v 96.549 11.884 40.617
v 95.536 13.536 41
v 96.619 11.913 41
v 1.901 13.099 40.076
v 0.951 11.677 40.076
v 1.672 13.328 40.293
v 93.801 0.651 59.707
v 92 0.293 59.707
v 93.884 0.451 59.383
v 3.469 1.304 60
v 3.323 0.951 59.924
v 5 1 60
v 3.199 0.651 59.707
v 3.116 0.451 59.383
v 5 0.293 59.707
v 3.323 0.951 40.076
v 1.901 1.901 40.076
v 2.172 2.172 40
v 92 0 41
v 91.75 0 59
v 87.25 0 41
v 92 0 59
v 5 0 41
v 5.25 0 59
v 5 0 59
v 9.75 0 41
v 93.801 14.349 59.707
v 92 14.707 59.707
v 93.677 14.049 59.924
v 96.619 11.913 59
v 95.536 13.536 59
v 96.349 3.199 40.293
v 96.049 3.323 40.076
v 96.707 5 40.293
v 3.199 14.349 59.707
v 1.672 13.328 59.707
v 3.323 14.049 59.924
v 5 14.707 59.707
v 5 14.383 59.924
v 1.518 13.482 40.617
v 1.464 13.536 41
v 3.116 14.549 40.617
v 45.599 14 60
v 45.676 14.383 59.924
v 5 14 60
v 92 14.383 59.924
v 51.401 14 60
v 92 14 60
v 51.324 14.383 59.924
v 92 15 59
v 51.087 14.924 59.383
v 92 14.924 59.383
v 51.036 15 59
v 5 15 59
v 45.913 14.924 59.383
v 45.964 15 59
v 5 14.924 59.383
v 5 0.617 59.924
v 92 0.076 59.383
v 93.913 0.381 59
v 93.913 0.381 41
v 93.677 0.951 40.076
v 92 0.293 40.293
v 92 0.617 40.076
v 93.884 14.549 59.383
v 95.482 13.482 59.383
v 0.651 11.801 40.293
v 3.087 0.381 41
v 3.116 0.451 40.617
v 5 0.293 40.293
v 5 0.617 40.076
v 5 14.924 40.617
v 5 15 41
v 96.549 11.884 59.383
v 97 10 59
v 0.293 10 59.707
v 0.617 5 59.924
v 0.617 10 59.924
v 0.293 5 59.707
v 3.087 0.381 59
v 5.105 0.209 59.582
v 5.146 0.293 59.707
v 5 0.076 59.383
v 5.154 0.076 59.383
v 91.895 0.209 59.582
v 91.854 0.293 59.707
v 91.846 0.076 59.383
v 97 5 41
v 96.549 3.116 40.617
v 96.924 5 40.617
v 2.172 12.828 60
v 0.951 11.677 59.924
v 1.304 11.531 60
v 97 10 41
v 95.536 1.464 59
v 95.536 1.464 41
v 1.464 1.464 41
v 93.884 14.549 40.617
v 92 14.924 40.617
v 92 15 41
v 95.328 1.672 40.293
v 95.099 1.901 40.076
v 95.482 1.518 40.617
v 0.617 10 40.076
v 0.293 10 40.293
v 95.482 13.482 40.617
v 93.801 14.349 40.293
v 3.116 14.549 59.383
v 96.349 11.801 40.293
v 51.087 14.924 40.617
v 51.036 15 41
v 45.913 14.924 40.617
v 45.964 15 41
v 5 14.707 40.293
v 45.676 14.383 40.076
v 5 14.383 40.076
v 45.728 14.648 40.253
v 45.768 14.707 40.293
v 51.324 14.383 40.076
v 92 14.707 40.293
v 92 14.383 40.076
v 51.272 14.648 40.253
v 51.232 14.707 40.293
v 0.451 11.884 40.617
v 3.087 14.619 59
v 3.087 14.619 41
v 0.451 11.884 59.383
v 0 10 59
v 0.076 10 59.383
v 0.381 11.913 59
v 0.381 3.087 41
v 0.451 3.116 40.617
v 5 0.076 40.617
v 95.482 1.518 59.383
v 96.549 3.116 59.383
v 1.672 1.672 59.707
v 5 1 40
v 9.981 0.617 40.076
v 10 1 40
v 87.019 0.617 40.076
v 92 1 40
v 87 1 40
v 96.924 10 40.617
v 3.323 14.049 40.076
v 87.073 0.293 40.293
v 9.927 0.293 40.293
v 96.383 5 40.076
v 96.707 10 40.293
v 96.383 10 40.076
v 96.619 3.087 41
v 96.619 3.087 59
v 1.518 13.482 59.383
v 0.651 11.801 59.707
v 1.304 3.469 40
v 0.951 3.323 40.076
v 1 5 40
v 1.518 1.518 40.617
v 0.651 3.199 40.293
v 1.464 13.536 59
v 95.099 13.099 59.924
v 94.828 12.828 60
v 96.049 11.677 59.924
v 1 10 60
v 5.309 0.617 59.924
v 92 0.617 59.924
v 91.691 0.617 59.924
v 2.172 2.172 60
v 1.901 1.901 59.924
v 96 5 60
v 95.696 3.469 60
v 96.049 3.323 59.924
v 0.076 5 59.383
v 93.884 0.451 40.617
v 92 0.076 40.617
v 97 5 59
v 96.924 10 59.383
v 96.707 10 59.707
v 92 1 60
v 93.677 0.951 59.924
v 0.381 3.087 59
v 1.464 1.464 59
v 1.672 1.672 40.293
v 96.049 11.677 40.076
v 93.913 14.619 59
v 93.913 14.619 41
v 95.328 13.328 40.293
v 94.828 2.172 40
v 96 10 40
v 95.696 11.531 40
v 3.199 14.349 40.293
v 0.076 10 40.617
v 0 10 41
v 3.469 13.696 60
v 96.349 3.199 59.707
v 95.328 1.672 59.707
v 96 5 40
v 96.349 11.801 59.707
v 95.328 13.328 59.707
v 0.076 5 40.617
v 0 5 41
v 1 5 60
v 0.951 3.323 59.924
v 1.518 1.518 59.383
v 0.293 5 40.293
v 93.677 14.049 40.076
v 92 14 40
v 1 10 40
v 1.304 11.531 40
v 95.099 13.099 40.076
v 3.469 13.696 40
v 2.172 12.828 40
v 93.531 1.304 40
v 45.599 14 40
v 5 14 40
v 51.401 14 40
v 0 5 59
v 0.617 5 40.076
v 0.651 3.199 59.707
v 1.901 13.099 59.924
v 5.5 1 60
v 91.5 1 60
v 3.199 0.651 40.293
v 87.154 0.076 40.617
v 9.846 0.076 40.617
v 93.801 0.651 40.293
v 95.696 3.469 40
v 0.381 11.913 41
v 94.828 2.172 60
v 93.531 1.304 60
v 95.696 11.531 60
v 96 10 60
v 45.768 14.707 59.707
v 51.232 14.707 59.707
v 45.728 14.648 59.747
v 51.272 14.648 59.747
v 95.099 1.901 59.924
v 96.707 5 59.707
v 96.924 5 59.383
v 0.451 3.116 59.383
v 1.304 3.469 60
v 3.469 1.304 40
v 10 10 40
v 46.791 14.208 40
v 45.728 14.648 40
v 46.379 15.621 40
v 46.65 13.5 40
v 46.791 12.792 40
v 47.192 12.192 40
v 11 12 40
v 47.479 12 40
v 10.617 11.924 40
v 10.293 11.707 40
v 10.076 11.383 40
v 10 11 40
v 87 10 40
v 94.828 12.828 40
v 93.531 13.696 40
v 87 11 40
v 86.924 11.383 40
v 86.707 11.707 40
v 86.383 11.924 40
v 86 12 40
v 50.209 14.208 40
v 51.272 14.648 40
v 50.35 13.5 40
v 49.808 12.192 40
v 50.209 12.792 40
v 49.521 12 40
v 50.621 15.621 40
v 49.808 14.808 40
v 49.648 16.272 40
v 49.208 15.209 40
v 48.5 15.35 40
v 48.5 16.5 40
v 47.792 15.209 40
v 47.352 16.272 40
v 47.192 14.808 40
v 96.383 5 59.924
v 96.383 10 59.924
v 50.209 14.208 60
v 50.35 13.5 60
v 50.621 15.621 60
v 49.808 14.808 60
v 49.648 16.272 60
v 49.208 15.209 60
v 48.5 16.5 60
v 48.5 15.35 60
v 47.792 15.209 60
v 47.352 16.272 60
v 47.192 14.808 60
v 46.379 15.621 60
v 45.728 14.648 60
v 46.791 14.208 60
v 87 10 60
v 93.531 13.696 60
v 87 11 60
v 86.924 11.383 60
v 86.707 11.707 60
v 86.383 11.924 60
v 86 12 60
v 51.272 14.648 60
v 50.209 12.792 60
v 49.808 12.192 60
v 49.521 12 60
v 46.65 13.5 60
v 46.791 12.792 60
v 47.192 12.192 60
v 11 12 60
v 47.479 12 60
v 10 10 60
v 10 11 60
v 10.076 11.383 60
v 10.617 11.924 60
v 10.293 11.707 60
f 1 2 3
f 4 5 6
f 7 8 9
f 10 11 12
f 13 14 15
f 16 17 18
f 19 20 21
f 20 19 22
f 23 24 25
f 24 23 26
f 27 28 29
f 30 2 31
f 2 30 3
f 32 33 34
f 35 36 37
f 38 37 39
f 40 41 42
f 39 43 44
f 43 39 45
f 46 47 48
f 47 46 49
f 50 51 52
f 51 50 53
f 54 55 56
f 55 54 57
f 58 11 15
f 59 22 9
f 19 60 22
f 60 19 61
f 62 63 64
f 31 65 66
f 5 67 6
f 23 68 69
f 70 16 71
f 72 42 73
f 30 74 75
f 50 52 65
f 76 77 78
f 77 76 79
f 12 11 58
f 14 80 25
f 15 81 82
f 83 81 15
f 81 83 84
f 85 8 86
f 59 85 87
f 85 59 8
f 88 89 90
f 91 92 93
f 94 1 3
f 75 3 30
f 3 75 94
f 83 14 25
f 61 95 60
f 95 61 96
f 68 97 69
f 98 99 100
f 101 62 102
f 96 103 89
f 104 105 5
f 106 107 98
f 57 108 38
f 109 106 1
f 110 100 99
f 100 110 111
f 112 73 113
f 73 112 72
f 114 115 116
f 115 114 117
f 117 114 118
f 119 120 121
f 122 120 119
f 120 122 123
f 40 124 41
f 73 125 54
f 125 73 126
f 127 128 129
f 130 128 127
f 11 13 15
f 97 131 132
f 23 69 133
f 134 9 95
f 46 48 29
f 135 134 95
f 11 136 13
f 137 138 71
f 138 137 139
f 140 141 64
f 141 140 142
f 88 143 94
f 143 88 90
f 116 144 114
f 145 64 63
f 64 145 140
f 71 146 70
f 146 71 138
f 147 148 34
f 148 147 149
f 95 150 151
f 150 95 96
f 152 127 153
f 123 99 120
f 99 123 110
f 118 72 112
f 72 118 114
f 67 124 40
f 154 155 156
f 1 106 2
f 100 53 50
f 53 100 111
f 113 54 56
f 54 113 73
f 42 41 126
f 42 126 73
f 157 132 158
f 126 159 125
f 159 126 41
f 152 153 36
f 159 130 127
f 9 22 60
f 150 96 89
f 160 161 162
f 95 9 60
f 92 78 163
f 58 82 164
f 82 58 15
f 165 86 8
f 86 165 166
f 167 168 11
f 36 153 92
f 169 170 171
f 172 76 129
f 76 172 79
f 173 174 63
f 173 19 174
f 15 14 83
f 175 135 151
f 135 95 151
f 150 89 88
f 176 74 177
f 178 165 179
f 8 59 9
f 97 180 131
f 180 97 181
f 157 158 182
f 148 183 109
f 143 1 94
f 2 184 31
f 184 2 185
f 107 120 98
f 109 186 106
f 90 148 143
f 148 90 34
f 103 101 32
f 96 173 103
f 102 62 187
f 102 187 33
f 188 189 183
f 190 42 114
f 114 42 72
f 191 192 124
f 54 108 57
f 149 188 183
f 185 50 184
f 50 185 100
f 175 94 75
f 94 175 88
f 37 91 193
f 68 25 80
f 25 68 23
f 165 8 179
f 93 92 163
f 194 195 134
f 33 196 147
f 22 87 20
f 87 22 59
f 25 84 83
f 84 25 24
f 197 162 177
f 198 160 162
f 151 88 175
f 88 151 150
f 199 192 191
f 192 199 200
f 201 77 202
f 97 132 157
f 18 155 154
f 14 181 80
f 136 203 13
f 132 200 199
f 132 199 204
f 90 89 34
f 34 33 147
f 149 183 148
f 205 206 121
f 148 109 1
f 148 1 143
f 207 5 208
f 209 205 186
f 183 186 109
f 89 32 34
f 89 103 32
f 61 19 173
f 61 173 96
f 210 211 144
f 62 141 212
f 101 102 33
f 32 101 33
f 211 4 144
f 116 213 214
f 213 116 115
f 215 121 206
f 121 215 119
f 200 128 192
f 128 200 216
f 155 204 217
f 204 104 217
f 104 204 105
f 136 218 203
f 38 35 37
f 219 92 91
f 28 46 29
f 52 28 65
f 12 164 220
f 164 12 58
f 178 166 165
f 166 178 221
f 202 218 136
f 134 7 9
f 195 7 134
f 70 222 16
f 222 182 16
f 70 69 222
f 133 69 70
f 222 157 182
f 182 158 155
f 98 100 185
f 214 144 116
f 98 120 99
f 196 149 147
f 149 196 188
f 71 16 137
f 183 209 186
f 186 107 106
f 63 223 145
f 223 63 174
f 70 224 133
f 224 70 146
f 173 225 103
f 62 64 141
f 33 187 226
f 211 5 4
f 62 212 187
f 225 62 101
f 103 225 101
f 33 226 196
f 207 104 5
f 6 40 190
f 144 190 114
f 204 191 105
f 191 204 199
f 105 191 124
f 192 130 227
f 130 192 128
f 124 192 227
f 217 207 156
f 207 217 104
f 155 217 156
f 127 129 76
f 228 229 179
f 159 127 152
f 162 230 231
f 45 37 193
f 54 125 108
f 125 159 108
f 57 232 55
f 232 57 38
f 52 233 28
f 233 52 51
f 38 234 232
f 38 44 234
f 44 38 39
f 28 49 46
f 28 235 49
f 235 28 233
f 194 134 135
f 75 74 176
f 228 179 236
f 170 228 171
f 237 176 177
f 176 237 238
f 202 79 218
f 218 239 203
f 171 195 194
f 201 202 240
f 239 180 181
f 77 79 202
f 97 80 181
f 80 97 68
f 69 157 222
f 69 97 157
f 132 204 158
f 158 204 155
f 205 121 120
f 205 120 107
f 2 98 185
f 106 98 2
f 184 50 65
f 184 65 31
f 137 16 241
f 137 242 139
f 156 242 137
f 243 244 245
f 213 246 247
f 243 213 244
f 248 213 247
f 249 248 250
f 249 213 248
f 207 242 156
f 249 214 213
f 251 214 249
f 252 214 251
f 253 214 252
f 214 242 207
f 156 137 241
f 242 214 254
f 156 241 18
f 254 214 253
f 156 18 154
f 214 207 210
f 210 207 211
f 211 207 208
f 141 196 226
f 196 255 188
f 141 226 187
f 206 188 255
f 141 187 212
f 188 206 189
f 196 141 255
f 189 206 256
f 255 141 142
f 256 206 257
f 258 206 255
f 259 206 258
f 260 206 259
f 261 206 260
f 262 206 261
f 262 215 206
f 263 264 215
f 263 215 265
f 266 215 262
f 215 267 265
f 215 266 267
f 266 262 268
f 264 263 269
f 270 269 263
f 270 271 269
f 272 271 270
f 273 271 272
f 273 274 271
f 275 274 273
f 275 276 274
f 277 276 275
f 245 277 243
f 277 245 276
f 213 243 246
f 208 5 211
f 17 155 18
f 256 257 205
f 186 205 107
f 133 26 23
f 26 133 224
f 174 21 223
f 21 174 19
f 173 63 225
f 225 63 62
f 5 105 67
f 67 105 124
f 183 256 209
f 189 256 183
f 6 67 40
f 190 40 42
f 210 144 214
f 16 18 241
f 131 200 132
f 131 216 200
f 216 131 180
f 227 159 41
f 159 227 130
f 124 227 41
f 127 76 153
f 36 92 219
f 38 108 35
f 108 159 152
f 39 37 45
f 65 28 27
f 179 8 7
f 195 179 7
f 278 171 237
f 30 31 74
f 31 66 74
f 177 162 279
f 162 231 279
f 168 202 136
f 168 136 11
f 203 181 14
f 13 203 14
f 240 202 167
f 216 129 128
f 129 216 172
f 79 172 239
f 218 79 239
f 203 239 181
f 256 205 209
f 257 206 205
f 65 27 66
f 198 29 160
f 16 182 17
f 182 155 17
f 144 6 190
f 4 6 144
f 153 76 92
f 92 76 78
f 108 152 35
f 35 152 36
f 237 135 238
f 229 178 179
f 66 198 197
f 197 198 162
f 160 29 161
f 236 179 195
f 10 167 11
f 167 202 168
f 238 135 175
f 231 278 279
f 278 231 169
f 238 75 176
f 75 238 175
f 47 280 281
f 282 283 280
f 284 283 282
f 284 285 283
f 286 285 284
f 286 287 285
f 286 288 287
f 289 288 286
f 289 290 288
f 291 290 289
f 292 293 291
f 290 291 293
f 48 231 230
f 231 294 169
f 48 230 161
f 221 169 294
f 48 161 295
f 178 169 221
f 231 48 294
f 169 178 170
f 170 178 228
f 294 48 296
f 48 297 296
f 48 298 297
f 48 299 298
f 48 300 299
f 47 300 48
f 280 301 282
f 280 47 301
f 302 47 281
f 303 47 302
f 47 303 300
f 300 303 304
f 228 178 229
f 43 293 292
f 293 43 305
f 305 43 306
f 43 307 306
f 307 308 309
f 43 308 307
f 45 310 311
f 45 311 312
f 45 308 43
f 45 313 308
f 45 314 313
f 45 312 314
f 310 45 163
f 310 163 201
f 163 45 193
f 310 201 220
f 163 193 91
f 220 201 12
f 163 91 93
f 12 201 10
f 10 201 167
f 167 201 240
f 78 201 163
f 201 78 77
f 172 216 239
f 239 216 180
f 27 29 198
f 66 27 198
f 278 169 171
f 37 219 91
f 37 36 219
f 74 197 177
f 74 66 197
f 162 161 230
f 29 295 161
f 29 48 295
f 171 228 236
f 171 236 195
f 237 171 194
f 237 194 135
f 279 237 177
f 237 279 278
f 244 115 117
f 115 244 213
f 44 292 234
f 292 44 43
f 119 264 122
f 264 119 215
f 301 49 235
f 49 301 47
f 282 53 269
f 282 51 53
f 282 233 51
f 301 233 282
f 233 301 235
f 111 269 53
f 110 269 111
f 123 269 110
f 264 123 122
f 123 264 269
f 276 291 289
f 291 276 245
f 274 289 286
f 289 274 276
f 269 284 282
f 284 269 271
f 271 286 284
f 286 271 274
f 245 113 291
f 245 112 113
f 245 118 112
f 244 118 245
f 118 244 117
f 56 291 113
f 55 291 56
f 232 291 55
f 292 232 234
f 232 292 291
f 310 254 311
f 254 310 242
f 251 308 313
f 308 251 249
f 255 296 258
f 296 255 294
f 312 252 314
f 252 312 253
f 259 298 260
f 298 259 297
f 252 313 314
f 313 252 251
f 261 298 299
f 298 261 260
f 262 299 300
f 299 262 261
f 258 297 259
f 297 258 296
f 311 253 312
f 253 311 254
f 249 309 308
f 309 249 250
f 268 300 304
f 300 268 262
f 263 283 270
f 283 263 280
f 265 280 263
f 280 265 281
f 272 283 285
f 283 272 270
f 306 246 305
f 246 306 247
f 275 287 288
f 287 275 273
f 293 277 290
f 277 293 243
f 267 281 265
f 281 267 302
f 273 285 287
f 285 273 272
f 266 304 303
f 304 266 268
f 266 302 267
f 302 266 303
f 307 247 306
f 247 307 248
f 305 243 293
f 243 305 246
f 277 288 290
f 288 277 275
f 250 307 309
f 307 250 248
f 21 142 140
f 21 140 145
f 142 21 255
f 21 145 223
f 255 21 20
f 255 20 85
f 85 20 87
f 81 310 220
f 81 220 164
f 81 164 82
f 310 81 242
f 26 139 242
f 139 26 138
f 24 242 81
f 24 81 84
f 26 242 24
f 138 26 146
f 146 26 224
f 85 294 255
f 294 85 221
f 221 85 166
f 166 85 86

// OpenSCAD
module torus() {
    rotate_extrude() {
        translate([4,0])
            circle(r=1, $fn=16);
    }
}
module roundedbox(w,h,d){
    // torus has r=5 h=2
    tr = 5;
    trh = 1;
    hull(){        
        translate([  tr,  tr,  trh])torus();
        translate([w-tr,  tr,  trh])torus();
        translate([w-tr,h-tr,  trh])torus();
        translate([  tr,h-tr,  trh])torus();
        translate([  tr,  tr,d-trh])torus();
        translate([w-tr,  tr,d-trh])torus();
        translate([w-tr,h-tr,d-trh])torus();
        translate([  tr,h-tr,d-trh])torus();
    }
}
module phone(){
    roundedbox(    w=77,    d=/*13.8*/25,    h=160);
}


difference() {
    union() {        
        translate([0,0,40])
            roundedbox(97,15,20);
        
        translate([97/2, 13.5, 40])
            cylinder(d=6, h=20, $fn=16);
    }
    translate([10,12,30])
    {
        rotate([90,0,0])
        {
            phone();                                               
        }
    }         
    translate([97/2, 13.5, 15])
            cylinder(d=3.7, h=70, $fn=16);
    hull()
    {
        translate([10,-5,40])
            cube([77, 15, 20]);
        translate([5,-5,60])
            cube([87, 5, 20]);
    }
}

//*/
